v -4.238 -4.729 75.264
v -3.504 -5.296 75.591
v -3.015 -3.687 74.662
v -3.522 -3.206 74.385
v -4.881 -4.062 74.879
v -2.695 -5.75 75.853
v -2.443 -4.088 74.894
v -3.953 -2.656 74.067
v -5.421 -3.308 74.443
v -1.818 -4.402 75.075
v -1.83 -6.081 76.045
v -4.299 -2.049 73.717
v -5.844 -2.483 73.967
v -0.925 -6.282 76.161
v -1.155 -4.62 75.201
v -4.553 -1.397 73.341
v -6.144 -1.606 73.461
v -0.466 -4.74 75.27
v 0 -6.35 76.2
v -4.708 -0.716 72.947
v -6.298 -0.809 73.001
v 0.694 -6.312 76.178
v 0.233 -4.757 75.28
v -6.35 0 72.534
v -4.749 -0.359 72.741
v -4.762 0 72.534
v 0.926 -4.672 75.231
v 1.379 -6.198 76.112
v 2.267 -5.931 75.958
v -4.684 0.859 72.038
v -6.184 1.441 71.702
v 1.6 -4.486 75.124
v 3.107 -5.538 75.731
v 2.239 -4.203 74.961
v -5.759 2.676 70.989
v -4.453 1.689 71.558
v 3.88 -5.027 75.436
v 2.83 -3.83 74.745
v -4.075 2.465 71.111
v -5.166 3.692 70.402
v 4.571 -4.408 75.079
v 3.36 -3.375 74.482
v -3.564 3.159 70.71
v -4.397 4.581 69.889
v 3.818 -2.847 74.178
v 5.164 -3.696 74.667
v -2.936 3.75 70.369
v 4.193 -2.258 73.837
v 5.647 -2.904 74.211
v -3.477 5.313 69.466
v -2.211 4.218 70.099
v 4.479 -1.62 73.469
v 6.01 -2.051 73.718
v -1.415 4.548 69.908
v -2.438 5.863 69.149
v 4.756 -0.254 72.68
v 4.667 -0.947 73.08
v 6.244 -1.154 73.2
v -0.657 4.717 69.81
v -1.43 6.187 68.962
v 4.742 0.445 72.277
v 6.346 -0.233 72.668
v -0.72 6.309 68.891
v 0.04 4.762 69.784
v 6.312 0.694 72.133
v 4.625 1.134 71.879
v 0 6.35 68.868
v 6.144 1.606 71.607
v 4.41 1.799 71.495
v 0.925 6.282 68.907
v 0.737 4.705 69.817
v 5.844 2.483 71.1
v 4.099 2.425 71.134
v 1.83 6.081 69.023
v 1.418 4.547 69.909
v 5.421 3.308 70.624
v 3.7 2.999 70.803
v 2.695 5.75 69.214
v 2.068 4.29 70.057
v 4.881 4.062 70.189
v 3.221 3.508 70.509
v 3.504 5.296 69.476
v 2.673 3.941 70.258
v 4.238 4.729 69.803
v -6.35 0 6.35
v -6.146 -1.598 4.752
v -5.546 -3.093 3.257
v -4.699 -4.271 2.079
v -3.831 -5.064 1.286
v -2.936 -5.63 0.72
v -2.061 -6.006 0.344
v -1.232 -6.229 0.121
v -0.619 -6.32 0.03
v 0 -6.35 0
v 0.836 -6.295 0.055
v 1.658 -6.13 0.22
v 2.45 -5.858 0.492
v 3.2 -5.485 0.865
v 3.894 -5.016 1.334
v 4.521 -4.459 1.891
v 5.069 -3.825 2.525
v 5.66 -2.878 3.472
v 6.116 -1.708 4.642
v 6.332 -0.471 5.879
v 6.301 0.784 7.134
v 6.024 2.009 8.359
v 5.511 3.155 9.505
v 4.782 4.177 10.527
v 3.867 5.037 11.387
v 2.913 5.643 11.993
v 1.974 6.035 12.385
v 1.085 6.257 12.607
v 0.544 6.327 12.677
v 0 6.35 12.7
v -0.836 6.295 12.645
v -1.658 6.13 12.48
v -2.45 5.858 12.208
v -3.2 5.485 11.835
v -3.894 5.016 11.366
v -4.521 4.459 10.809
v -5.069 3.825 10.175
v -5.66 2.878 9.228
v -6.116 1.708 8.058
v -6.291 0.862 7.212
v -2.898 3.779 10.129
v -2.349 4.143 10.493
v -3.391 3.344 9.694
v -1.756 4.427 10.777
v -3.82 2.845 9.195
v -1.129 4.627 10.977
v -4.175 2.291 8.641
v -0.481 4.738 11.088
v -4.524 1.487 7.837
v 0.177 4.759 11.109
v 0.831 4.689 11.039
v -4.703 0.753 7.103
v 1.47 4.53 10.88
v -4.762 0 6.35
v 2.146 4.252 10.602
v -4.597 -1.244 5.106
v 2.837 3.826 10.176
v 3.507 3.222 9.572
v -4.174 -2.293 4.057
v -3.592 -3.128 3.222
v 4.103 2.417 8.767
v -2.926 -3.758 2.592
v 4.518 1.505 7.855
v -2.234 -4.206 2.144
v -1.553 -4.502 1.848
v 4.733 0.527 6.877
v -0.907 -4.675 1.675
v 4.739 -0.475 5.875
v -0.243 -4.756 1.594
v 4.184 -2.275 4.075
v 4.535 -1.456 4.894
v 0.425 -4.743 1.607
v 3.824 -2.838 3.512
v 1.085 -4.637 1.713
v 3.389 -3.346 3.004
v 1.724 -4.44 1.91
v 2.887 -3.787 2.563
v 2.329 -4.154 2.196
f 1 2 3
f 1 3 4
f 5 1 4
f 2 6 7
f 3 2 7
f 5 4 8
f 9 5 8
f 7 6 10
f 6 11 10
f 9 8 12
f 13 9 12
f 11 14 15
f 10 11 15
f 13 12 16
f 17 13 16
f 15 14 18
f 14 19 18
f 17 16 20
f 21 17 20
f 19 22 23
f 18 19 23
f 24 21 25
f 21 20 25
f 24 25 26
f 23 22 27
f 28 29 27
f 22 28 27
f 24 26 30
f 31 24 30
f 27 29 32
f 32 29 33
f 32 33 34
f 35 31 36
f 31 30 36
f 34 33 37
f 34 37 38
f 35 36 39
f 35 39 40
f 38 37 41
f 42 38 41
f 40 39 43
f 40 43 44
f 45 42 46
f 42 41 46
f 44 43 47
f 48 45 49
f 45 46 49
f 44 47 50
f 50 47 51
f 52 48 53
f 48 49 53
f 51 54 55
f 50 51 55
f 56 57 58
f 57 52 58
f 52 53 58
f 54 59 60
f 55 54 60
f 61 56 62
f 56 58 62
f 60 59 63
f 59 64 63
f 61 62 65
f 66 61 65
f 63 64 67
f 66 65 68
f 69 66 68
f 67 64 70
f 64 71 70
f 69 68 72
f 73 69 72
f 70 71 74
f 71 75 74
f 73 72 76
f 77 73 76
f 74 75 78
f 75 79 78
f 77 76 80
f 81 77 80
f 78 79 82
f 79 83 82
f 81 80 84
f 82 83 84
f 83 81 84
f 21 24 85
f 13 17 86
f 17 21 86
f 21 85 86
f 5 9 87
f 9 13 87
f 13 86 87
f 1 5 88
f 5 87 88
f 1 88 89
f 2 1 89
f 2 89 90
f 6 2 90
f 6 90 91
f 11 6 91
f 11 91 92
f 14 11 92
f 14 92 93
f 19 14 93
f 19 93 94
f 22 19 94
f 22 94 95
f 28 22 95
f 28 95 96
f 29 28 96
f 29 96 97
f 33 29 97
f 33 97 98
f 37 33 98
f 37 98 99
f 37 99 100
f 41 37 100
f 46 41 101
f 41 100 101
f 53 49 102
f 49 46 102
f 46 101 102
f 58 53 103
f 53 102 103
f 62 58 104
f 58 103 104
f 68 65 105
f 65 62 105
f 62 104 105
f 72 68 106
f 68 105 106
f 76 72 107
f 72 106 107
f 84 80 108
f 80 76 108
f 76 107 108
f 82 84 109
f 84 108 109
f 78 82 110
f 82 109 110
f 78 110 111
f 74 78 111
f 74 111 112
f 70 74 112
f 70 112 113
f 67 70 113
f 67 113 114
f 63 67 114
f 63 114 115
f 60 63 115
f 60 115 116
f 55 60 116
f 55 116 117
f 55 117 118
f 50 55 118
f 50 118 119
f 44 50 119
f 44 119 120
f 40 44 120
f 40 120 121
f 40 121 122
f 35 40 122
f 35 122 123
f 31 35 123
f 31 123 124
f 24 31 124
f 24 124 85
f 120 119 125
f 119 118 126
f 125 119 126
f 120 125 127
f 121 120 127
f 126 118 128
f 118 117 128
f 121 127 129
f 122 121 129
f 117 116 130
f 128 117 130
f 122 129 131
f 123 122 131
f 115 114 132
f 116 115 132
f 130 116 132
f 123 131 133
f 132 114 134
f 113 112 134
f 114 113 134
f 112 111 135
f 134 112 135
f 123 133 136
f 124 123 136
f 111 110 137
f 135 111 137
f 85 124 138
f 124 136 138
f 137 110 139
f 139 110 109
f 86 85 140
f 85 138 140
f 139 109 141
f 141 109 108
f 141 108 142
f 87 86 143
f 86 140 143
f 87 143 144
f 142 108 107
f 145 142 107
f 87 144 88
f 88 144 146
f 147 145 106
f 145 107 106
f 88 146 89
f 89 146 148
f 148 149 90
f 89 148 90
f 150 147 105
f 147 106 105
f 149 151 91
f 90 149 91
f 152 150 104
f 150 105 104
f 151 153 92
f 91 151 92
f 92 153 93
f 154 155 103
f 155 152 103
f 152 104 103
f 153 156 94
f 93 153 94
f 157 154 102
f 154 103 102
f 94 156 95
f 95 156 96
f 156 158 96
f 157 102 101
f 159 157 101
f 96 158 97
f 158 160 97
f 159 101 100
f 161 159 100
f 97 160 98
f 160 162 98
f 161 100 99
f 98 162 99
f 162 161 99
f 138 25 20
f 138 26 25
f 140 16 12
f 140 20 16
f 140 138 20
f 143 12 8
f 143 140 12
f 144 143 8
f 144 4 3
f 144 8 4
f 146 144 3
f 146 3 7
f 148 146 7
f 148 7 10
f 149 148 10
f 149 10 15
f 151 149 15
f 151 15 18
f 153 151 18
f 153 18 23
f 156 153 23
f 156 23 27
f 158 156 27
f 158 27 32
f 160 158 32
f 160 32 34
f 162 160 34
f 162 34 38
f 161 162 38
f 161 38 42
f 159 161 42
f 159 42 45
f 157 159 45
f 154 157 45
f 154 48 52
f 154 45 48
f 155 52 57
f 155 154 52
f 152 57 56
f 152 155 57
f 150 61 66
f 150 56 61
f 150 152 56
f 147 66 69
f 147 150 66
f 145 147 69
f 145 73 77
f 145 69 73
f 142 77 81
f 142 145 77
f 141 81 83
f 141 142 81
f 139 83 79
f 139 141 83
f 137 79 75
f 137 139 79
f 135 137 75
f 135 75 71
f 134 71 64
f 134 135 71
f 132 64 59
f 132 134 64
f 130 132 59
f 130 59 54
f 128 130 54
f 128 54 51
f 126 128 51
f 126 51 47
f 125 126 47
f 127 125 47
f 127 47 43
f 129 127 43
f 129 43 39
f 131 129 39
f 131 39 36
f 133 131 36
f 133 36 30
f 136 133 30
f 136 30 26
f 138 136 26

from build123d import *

# Parameters (mm, degrees)
SKETCH1_R           = 6.35
SKETCH1_R_2         = 4.7625
BOSS_EXTRUDE1_DEPTH = 76.2
CUT_EXTRUDE1_DEPTH  = 38.1
CUT_EXTRUDE3_DEPTH  = 38.1


with BuildPart() as part:
    # Sketch1 → Boss-Extrude1 (new body)
    with BuildSketch(Plane.XY):
        with Locations(Location((0, 0, 0), (0, 0, 180))):
            Circle(SKETCH1_R)
        with Locations(Location((0, 0, 0), (0, 0, 180))):
            Circle(SKETCH1_R_2, mode=Mode.SUBTRACT)
    extrude(amount=BOSS_EXTRUDE1_DEPTH)

    # Sketch2 → Cut-Extrude1 (cut, symmetric)
    with BuildSketch(Plane(origin=(0, 0, 0), x_dir=(0, 0, -1), z_dir=(1, 0, 0))):
        Polygon((-76.2, -6.35), (-68.867651581, 6.35), (-76.2, 6.35), align=None)
    extrude(amount=CUT_EXTRUDE1_DEPTH, both=True, mode=Mode.SUBTRACT)

    # Sketch3 → Cut-Extrude3 (cut, symmetric)
    with BuildSketch(Plane(origin=(0, 0, 0), x_dir=(0, 0, -1), z_dir=(1, 0, 0))):
        Polygon((-12.7, 6.35), (0, -6.35), (0, 6.35), align=None)
    extrude(amount=CUT_EXTRUDE3_DEPTH, both=True, mode=Mode.SUBTRACT)


solid = part.part
